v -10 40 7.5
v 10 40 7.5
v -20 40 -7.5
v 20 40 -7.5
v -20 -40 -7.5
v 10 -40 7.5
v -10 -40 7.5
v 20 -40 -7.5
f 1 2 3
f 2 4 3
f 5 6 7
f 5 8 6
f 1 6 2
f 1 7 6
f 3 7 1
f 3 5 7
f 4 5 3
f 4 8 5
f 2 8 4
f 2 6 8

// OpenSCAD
B=40;   // Base larga
b=20;   // Base corta
h=15;   // Altura

// Dibujamos la figura
rotate([90, 0, 0])      // Rotamos 90º en el eje X
linear_extrude(height= 80, center=true){    // Extruimos
    // Puntos para definir el poligono en sentido horario
    polygon (points = [
        [-B/2, -h/2],   // Vértice de base, lado izquierdo.
        [-b/2, h/2],    // Vértice superior izquierdo.
        [b/2, h/2],     // Vértice superior derecho.
        [B/2, -h/2]     // Vértice de la base, derecho.
    ]);
}
